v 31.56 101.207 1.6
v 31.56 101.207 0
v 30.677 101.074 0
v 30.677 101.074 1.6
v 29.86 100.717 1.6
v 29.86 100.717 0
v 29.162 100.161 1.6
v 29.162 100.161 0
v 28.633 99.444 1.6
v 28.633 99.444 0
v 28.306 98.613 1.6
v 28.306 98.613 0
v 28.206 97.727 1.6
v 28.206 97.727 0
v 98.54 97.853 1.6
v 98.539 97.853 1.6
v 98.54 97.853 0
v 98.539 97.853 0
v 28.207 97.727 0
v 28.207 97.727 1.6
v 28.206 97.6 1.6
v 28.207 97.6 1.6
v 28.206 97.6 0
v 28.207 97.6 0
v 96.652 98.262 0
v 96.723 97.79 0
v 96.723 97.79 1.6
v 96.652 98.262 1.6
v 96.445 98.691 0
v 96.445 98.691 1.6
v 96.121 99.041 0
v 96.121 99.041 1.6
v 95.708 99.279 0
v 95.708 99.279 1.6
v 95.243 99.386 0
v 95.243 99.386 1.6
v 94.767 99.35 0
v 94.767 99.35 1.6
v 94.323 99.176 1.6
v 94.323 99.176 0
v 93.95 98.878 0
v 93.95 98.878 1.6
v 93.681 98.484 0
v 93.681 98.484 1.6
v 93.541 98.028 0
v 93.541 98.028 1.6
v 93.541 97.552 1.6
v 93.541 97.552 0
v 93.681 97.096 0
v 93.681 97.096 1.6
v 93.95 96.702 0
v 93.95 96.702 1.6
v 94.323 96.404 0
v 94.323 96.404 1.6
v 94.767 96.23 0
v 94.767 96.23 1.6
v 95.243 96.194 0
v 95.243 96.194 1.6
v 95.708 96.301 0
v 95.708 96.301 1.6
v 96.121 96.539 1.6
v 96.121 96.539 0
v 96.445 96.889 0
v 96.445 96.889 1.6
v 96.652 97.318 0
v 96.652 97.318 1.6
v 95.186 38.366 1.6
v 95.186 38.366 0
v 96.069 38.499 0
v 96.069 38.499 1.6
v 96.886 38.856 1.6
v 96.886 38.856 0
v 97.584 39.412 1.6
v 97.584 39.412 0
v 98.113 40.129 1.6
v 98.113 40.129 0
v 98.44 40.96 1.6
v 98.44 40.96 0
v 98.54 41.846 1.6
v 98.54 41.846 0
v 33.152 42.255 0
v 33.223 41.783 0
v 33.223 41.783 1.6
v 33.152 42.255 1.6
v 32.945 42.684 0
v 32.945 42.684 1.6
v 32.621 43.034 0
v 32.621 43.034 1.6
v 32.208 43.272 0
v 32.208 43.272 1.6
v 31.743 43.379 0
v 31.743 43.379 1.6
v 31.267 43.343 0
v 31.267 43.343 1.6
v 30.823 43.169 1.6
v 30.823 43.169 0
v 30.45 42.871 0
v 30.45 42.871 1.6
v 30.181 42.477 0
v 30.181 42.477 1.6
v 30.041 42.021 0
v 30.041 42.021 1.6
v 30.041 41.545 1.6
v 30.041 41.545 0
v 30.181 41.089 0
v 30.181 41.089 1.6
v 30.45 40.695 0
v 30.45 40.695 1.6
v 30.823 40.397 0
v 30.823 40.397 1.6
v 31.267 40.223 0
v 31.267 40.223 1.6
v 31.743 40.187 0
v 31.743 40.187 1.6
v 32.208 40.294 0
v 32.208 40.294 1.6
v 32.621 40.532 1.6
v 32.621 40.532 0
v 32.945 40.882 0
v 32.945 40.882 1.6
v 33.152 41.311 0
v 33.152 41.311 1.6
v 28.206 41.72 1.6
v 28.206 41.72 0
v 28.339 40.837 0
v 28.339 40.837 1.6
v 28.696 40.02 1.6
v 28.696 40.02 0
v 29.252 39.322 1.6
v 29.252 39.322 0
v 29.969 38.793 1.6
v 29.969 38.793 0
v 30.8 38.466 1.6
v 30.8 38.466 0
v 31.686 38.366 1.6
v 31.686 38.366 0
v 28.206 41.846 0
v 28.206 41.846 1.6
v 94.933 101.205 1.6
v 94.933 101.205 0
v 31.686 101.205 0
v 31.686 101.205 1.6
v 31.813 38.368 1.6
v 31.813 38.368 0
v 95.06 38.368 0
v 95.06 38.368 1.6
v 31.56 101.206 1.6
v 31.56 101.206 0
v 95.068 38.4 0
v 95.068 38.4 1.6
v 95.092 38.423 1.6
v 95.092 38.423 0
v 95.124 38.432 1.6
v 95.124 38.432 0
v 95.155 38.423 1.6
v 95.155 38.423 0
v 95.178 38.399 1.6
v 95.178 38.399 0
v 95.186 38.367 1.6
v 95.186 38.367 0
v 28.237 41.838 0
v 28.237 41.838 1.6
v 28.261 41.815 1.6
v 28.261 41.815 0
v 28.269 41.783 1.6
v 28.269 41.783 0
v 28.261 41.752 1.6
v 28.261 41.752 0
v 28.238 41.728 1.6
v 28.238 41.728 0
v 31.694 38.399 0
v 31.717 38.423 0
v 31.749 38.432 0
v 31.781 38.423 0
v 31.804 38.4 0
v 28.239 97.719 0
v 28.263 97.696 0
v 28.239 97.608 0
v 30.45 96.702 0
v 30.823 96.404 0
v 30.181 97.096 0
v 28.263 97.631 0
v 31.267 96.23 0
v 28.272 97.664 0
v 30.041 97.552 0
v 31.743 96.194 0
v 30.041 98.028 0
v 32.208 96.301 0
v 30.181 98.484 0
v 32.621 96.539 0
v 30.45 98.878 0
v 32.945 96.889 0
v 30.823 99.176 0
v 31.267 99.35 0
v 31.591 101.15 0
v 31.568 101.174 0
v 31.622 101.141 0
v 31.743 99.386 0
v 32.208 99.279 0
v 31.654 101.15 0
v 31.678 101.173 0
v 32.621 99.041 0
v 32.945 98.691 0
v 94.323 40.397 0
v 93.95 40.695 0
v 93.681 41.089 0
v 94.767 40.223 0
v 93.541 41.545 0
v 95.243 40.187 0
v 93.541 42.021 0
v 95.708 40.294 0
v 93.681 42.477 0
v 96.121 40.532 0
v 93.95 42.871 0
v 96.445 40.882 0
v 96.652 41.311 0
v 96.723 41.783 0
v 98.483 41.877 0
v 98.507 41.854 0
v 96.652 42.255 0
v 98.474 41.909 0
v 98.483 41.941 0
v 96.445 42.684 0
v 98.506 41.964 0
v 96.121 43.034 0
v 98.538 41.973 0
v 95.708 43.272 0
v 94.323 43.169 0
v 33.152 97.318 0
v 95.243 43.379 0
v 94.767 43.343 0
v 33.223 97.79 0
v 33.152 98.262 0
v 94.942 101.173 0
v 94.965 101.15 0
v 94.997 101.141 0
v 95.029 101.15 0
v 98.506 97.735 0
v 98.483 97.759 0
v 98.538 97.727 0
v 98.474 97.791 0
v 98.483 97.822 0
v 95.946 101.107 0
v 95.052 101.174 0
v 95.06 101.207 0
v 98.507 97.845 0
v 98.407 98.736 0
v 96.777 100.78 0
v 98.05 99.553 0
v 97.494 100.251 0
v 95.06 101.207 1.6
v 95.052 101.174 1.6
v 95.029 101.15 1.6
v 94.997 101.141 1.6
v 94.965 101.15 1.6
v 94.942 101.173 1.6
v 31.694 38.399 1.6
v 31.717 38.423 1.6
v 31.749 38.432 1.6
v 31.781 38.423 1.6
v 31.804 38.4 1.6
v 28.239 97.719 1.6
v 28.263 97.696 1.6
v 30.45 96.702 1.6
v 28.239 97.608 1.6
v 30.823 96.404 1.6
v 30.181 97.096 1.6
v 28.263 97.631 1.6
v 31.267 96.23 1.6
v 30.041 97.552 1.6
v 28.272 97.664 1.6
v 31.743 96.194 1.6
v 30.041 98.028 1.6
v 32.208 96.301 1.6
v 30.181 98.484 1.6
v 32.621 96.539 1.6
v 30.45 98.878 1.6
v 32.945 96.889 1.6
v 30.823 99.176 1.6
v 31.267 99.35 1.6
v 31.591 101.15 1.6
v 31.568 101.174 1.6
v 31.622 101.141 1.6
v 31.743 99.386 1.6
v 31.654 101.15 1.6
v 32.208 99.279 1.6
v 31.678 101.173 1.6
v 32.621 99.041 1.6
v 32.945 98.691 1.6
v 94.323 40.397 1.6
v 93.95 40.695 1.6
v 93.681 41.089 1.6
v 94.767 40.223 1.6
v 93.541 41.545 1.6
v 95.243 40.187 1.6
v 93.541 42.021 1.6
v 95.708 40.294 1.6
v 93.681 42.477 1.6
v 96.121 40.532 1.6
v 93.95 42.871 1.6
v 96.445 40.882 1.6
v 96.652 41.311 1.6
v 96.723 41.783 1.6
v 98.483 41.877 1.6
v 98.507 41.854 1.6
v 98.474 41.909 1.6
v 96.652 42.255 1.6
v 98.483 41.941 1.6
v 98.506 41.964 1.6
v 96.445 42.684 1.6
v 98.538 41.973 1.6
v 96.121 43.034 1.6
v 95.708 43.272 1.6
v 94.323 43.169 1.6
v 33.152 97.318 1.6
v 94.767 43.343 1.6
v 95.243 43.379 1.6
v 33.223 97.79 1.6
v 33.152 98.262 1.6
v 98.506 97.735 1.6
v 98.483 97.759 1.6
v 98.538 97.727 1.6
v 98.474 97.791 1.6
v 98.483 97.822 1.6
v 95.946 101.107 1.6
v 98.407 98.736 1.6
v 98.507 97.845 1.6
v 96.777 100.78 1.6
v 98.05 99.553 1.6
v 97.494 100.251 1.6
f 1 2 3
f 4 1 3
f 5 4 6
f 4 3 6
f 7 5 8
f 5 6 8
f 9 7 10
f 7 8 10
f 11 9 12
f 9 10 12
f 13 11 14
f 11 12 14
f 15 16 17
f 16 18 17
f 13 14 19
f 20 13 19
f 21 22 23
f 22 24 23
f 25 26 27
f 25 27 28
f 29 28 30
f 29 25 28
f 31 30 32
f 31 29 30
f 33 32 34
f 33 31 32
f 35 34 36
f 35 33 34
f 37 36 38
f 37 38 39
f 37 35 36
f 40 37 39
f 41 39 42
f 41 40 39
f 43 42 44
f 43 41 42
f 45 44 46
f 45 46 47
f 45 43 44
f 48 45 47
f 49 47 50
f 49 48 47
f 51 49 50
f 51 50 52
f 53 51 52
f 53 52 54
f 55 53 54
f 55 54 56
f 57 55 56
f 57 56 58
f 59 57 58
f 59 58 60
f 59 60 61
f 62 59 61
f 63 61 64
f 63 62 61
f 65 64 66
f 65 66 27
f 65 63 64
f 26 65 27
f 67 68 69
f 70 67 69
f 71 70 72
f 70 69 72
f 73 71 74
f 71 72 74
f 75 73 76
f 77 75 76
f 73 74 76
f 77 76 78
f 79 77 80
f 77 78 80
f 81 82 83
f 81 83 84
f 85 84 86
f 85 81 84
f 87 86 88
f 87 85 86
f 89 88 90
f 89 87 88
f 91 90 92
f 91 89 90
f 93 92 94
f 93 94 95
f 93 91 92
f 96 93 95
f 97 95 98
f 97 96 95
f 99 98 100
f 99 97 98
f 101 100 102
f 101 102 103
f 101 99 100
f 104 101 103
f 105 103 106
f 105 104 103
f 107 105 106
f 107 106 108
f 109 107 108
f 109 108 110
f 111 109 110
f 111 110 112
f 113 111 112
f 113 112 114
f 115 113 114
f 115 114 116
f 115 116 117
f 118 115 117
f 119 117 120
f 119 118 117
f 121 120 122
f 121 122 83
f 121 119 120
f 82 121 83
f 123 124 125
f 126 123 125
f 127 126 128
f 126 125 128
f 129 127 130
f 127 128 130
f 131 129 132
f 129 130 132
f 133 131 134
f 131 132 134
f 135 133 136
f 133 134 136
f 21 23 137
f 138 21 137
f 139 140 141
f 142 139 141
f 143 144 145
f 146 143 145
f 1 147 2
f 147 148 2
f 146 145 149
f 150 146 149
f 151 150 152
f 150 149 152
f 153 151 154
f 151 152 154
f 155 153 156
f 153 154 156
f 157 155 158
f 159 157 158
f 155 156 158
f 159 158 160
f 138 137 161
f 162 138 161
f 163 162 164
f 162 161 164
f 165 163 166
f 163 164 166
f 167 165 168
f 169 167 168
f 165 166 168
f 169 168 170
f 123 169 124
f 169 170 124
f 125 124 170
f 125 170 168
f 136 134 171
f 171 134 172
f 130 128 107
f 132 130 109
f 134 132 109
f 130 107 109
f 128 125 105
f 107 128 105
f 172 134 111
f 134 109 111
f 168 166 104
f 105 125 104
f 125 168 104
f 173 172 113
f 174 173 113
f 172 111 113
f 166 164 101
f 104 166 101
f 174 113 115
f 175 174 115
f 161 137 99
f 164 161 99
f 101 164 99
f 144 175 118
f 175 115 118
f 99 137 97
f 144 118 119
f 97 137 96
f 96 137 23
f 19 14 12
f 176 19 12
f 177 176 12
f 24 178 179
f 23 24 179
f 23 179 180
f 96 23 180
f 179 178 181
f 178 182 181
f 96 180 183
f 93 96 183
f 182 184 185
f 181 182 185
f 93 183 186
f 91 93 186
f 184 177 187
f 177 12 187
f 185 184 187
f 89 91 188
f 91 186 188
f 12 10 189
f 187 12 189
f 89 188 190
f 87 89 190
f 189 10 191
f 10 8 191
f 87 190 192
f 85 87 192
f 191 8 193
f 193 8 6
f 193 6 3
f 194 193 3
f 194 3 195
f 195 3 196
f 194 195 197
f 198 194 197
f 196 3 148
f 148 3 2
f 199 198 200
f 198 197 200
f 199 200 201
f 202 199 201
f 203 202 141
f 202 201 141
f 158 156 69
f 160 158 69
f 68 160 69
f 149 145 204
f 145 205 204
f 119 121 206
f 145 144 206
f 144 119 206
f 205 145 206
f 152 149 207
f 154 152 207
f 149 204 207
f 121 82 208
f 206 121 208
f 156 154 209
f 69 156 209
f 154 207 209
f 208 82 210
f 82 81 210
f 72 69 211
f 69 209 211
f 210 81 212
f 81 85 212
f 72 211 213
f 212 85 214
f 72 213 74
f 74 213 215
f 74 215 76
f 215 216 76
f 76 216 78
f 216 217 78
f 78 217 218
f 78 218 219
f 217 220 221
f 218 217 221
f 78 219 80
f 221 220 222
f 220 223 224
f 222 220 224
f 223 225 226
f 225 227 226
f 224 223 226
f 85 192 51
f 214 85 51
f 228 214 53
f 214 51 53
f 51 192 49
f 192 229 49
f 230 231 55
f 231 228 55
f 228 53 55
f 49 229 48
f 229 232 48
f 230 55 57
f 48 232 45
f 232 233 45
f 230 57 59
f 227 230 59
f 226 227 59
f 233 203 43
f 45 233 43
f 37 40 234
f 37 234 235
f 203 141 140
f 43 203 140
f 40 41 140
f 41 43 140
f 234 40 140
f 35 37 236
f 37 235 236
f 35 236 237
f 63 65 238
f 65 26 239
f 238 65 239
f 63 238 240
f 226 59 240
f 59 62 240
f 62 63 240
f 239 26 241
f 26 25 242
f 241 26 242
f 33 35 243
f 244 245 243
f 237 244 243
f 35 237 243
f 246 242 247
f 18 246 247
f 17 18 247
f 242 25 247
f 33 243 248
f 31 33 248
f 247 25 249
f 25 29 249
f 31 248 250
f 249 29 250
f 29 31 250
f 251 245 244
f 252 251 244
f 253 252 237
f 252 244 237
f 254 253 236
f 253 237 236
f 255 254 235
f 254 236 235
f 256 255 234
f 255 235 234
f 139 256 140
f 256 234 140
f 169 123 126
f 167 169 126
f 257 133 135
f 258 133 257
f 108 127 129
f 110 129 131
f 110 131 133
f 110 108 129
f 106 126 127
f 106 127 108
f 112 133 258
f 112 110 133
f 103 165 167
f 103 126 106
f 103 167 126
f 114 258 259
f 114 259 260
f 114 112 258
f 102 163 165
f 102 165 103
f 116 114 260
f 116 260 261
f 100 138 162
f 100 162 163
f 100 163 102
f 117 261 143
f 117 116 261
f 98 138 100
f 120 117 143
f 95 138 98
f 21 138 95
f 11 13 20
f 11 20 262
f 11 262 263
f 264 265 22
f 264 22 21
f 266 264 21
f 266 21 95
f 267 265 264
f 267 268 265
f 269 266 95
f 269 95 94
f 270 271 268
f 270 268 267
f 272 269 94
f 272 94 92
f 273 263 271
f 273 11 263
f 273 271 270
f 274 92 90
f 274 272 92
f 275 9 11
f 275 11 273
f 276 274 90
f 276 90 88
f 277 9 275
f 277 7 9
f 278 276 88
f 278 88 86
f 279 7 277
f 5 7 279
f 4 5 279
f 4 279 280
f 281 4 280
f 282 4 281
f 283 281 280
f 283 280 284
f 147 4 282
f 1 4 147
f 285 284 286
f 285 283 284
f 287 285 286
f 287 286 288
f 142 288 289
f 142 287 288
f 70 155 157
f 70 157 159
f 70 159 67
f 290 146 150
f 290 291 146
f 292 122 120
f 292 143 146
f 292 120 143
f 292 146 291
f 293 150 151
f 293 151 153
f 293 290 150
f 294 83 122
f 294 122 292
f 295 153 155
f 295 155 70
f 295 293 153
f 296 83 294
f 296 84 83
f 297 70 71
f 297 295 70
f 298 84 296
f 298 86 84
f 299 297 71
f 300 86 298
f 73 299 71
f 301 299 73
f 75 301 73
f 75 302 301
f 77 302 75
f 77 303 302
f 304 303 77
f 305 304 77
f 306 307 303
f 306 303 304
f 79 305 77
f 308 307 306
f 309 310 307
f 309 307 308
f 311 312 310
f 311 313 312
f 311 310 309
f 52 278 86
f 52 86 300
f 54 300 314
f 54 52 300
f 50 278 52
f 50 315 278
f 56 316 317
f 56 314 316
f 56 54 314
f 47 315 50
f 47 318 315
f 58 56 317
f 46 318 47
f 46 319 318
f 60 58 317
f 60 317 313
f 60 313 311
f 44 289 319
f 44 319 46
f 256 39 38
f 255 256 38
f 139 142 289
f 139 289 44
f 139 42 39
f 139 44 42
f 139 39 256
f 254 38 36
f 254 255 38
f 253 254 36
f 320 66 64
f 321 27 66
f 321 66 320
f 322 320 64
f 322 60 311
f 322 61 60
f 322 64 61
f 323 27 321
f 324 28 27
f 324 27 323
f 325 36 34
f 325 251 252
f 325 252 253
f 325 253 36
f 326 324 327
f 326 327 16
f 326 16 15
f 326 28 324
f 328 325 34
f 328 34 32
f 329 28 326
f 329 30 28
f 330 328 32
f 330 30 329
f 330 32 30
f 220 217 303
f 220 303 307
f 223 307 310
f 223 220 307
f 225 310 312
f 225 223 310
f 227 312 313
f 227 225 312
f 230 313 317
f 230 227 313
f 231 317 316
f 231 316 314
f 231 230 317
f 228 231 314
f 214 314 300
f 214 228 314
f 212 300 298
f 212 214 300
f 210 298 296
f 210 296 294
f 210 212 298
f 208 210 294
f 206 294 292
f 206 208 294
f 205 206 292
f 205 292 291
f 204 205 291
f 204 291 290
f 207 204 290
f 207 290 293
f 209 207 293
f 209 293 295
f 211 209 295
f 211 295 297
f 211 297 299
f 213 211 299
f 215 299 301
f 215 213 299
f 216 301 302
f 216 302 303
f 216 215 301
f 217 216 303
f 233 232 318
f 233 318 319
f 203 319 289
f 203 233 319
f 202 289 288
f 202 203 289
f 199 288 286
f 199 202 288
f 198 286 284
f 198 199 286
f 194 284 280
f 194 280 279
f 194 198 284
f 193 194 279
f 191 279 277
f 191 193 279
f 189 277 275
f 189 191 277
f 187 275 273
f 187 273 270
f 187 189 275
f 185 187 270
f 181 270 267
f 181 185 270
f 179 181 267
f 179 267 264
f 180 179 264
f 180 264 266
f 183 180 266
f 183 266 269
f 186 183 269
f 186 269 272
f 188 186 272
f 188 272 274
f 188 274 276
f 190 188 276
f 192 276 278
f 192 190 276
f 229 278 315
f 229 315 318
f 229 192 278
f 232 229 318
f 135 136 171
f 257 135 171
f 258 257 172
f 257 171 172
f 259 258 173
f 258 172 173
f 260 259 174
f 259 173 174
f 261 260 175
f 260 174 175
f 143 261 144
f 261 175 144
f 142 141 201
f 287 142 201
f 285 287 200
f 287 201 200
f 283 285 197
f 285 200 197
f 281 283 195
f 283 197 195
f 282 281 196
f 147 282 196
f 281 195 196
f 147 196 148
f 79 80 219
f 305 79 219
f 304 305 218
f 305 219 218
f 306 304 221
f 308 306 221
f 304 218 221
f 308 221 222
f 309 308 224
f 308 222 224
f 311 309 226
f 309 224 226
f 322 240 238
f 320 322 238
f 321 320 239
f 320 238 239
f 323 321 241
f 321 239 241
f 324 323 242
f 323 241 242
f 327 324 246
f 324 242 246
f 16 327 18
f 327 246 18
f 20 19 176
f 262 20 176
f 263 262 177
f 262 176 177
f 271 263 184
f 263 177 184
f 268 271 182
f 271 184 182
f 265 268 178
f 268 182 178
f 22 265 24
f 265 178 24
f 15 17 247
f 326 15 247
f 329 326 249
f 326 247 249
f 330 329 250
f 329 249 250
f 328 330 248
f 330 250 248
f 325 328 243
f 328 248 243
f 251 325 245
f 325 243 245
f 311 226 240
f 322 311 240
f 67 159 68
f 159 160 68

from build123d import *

# Parameters (mm, degrees)
EXTRUDE_1_DEPTH     = 1.6
VIAHOLELAYER_R      = 1.6
CUT_EXTRUDE_2_DEPTH = 1.6


# Read off the part's stored shape, not the designer's step: 凸台-拉伸1
with BuildPart() as part:
    # 凸台-拉伸1 outline → 凸台-拉伸1 (new body)
    with BuildSketch(Plane.XY):
        with BuildLine():
            Line((28.205781396, 97.600023259), (28.205781396, 41.846499647))
            ThreePointArc((28.205781396, 41.846499647), (28.269280711, 41.783294645), (28.206371386, 41.719502388))
            ThreePointArc((28.206371386, 41.719502388), (29.251799434, 39.322351184), (31.68600117, 38.36636185))
            ThreePointArc((31.68600117, 38.36636185), (31.7485964, 38.431616297), (31.81297676, 38.3681224))
            Line((31.81297676, 38.3681224), (95.0595, 38.3681224))
            ThreePointArc((95.0595, 38.3681224), (95.123585364, 38.431619702), (95.186489208, 38.366951722))
            ThreePointArc((95.186489208, 38.366951722), (95.186493897, 38.366661387), (95.186497259, 38.366371034))
            ThreePointArc((95.186497259, 38.366371034), (97.583648579, 39.411799201), (98.539637791, 41.846001151))
            ThreePointArc((98.539637791, 41.846001151), (98.474383338, 41.908596378), (98.537877235, 41.972976741))
            Line((98.537877235, 41.972976741), (98.537877235, 97.726500353))
            ThreePointArc((98.537877235, 97.726500353), (98.474379933, 97.79058572), (98.539047919, 97.85348956))
            ThreePointArc((98.539047919, 97.85348956), (98.539338257, 97.85349425), (98.539628614, 97.853497612))
            ThreePointArc((98.539628614, 97.853497612), (97.494200566, 100.250648816), (95.05999883, 101.20663815))
            ThreePointArc((95.05999883, 101.20663815), (94.9974036, 101.141383703), (94.93302324, 101.2048776))
            Line((94.93302324, 101.2048776), (31.6865, 101.2048776))
            ThreePointArc((31.6865, 101.2048776), (31.622414636, 101.141380298), (31.559510792, 101.206048278))
            ThreePointArc((31.559510792, 101.206048278), (31.559506103, 101.206338613), (31.559502741, 101.206628966))
            ThreePointArc((31.559502741, 101.206628966), (29.162358971, 100.161208634), (28.206361808, 97.727020607))
            ThreePointArc((28.206361808, 97.727020607), (28.206656954, 97.727017223), (28.206952081, 97.727012467))
            ThreePointArc((28.206952081, 97.727012467), (28.271622765, 97.663523259), (28.206952081, 97.600034052))
            ThreePointArc((28.206952081, 97.600034052), (28.206366763, 97.600025958), (28.205781396, 97.600023259))
        make_face()
    extrude(amount=EXTRUDE_1_DEPTH)

    # ViaHoleLayer → 切除-拉伸2 (cut)
    with BuildSketch(Plane.XY):
        with Locations((95.12300254, 97.79)):
            Circle(VIAHOLELAYER_R)
        with Locations((95.12300254, 41.783)):
            Circle(VIAHOLELAYER_R)
        with Locations((31.623, 41.783)):
            Circle(VIAHOLELAYER_R)
        with Locations((31.623, 97.79)):
            Circle(VIAHOLELAYER_R)
    extrude(amount=CUT_EXTRUDE_2_DEPTH, mode=Mode.SUBTRACT)


solid = part.part
